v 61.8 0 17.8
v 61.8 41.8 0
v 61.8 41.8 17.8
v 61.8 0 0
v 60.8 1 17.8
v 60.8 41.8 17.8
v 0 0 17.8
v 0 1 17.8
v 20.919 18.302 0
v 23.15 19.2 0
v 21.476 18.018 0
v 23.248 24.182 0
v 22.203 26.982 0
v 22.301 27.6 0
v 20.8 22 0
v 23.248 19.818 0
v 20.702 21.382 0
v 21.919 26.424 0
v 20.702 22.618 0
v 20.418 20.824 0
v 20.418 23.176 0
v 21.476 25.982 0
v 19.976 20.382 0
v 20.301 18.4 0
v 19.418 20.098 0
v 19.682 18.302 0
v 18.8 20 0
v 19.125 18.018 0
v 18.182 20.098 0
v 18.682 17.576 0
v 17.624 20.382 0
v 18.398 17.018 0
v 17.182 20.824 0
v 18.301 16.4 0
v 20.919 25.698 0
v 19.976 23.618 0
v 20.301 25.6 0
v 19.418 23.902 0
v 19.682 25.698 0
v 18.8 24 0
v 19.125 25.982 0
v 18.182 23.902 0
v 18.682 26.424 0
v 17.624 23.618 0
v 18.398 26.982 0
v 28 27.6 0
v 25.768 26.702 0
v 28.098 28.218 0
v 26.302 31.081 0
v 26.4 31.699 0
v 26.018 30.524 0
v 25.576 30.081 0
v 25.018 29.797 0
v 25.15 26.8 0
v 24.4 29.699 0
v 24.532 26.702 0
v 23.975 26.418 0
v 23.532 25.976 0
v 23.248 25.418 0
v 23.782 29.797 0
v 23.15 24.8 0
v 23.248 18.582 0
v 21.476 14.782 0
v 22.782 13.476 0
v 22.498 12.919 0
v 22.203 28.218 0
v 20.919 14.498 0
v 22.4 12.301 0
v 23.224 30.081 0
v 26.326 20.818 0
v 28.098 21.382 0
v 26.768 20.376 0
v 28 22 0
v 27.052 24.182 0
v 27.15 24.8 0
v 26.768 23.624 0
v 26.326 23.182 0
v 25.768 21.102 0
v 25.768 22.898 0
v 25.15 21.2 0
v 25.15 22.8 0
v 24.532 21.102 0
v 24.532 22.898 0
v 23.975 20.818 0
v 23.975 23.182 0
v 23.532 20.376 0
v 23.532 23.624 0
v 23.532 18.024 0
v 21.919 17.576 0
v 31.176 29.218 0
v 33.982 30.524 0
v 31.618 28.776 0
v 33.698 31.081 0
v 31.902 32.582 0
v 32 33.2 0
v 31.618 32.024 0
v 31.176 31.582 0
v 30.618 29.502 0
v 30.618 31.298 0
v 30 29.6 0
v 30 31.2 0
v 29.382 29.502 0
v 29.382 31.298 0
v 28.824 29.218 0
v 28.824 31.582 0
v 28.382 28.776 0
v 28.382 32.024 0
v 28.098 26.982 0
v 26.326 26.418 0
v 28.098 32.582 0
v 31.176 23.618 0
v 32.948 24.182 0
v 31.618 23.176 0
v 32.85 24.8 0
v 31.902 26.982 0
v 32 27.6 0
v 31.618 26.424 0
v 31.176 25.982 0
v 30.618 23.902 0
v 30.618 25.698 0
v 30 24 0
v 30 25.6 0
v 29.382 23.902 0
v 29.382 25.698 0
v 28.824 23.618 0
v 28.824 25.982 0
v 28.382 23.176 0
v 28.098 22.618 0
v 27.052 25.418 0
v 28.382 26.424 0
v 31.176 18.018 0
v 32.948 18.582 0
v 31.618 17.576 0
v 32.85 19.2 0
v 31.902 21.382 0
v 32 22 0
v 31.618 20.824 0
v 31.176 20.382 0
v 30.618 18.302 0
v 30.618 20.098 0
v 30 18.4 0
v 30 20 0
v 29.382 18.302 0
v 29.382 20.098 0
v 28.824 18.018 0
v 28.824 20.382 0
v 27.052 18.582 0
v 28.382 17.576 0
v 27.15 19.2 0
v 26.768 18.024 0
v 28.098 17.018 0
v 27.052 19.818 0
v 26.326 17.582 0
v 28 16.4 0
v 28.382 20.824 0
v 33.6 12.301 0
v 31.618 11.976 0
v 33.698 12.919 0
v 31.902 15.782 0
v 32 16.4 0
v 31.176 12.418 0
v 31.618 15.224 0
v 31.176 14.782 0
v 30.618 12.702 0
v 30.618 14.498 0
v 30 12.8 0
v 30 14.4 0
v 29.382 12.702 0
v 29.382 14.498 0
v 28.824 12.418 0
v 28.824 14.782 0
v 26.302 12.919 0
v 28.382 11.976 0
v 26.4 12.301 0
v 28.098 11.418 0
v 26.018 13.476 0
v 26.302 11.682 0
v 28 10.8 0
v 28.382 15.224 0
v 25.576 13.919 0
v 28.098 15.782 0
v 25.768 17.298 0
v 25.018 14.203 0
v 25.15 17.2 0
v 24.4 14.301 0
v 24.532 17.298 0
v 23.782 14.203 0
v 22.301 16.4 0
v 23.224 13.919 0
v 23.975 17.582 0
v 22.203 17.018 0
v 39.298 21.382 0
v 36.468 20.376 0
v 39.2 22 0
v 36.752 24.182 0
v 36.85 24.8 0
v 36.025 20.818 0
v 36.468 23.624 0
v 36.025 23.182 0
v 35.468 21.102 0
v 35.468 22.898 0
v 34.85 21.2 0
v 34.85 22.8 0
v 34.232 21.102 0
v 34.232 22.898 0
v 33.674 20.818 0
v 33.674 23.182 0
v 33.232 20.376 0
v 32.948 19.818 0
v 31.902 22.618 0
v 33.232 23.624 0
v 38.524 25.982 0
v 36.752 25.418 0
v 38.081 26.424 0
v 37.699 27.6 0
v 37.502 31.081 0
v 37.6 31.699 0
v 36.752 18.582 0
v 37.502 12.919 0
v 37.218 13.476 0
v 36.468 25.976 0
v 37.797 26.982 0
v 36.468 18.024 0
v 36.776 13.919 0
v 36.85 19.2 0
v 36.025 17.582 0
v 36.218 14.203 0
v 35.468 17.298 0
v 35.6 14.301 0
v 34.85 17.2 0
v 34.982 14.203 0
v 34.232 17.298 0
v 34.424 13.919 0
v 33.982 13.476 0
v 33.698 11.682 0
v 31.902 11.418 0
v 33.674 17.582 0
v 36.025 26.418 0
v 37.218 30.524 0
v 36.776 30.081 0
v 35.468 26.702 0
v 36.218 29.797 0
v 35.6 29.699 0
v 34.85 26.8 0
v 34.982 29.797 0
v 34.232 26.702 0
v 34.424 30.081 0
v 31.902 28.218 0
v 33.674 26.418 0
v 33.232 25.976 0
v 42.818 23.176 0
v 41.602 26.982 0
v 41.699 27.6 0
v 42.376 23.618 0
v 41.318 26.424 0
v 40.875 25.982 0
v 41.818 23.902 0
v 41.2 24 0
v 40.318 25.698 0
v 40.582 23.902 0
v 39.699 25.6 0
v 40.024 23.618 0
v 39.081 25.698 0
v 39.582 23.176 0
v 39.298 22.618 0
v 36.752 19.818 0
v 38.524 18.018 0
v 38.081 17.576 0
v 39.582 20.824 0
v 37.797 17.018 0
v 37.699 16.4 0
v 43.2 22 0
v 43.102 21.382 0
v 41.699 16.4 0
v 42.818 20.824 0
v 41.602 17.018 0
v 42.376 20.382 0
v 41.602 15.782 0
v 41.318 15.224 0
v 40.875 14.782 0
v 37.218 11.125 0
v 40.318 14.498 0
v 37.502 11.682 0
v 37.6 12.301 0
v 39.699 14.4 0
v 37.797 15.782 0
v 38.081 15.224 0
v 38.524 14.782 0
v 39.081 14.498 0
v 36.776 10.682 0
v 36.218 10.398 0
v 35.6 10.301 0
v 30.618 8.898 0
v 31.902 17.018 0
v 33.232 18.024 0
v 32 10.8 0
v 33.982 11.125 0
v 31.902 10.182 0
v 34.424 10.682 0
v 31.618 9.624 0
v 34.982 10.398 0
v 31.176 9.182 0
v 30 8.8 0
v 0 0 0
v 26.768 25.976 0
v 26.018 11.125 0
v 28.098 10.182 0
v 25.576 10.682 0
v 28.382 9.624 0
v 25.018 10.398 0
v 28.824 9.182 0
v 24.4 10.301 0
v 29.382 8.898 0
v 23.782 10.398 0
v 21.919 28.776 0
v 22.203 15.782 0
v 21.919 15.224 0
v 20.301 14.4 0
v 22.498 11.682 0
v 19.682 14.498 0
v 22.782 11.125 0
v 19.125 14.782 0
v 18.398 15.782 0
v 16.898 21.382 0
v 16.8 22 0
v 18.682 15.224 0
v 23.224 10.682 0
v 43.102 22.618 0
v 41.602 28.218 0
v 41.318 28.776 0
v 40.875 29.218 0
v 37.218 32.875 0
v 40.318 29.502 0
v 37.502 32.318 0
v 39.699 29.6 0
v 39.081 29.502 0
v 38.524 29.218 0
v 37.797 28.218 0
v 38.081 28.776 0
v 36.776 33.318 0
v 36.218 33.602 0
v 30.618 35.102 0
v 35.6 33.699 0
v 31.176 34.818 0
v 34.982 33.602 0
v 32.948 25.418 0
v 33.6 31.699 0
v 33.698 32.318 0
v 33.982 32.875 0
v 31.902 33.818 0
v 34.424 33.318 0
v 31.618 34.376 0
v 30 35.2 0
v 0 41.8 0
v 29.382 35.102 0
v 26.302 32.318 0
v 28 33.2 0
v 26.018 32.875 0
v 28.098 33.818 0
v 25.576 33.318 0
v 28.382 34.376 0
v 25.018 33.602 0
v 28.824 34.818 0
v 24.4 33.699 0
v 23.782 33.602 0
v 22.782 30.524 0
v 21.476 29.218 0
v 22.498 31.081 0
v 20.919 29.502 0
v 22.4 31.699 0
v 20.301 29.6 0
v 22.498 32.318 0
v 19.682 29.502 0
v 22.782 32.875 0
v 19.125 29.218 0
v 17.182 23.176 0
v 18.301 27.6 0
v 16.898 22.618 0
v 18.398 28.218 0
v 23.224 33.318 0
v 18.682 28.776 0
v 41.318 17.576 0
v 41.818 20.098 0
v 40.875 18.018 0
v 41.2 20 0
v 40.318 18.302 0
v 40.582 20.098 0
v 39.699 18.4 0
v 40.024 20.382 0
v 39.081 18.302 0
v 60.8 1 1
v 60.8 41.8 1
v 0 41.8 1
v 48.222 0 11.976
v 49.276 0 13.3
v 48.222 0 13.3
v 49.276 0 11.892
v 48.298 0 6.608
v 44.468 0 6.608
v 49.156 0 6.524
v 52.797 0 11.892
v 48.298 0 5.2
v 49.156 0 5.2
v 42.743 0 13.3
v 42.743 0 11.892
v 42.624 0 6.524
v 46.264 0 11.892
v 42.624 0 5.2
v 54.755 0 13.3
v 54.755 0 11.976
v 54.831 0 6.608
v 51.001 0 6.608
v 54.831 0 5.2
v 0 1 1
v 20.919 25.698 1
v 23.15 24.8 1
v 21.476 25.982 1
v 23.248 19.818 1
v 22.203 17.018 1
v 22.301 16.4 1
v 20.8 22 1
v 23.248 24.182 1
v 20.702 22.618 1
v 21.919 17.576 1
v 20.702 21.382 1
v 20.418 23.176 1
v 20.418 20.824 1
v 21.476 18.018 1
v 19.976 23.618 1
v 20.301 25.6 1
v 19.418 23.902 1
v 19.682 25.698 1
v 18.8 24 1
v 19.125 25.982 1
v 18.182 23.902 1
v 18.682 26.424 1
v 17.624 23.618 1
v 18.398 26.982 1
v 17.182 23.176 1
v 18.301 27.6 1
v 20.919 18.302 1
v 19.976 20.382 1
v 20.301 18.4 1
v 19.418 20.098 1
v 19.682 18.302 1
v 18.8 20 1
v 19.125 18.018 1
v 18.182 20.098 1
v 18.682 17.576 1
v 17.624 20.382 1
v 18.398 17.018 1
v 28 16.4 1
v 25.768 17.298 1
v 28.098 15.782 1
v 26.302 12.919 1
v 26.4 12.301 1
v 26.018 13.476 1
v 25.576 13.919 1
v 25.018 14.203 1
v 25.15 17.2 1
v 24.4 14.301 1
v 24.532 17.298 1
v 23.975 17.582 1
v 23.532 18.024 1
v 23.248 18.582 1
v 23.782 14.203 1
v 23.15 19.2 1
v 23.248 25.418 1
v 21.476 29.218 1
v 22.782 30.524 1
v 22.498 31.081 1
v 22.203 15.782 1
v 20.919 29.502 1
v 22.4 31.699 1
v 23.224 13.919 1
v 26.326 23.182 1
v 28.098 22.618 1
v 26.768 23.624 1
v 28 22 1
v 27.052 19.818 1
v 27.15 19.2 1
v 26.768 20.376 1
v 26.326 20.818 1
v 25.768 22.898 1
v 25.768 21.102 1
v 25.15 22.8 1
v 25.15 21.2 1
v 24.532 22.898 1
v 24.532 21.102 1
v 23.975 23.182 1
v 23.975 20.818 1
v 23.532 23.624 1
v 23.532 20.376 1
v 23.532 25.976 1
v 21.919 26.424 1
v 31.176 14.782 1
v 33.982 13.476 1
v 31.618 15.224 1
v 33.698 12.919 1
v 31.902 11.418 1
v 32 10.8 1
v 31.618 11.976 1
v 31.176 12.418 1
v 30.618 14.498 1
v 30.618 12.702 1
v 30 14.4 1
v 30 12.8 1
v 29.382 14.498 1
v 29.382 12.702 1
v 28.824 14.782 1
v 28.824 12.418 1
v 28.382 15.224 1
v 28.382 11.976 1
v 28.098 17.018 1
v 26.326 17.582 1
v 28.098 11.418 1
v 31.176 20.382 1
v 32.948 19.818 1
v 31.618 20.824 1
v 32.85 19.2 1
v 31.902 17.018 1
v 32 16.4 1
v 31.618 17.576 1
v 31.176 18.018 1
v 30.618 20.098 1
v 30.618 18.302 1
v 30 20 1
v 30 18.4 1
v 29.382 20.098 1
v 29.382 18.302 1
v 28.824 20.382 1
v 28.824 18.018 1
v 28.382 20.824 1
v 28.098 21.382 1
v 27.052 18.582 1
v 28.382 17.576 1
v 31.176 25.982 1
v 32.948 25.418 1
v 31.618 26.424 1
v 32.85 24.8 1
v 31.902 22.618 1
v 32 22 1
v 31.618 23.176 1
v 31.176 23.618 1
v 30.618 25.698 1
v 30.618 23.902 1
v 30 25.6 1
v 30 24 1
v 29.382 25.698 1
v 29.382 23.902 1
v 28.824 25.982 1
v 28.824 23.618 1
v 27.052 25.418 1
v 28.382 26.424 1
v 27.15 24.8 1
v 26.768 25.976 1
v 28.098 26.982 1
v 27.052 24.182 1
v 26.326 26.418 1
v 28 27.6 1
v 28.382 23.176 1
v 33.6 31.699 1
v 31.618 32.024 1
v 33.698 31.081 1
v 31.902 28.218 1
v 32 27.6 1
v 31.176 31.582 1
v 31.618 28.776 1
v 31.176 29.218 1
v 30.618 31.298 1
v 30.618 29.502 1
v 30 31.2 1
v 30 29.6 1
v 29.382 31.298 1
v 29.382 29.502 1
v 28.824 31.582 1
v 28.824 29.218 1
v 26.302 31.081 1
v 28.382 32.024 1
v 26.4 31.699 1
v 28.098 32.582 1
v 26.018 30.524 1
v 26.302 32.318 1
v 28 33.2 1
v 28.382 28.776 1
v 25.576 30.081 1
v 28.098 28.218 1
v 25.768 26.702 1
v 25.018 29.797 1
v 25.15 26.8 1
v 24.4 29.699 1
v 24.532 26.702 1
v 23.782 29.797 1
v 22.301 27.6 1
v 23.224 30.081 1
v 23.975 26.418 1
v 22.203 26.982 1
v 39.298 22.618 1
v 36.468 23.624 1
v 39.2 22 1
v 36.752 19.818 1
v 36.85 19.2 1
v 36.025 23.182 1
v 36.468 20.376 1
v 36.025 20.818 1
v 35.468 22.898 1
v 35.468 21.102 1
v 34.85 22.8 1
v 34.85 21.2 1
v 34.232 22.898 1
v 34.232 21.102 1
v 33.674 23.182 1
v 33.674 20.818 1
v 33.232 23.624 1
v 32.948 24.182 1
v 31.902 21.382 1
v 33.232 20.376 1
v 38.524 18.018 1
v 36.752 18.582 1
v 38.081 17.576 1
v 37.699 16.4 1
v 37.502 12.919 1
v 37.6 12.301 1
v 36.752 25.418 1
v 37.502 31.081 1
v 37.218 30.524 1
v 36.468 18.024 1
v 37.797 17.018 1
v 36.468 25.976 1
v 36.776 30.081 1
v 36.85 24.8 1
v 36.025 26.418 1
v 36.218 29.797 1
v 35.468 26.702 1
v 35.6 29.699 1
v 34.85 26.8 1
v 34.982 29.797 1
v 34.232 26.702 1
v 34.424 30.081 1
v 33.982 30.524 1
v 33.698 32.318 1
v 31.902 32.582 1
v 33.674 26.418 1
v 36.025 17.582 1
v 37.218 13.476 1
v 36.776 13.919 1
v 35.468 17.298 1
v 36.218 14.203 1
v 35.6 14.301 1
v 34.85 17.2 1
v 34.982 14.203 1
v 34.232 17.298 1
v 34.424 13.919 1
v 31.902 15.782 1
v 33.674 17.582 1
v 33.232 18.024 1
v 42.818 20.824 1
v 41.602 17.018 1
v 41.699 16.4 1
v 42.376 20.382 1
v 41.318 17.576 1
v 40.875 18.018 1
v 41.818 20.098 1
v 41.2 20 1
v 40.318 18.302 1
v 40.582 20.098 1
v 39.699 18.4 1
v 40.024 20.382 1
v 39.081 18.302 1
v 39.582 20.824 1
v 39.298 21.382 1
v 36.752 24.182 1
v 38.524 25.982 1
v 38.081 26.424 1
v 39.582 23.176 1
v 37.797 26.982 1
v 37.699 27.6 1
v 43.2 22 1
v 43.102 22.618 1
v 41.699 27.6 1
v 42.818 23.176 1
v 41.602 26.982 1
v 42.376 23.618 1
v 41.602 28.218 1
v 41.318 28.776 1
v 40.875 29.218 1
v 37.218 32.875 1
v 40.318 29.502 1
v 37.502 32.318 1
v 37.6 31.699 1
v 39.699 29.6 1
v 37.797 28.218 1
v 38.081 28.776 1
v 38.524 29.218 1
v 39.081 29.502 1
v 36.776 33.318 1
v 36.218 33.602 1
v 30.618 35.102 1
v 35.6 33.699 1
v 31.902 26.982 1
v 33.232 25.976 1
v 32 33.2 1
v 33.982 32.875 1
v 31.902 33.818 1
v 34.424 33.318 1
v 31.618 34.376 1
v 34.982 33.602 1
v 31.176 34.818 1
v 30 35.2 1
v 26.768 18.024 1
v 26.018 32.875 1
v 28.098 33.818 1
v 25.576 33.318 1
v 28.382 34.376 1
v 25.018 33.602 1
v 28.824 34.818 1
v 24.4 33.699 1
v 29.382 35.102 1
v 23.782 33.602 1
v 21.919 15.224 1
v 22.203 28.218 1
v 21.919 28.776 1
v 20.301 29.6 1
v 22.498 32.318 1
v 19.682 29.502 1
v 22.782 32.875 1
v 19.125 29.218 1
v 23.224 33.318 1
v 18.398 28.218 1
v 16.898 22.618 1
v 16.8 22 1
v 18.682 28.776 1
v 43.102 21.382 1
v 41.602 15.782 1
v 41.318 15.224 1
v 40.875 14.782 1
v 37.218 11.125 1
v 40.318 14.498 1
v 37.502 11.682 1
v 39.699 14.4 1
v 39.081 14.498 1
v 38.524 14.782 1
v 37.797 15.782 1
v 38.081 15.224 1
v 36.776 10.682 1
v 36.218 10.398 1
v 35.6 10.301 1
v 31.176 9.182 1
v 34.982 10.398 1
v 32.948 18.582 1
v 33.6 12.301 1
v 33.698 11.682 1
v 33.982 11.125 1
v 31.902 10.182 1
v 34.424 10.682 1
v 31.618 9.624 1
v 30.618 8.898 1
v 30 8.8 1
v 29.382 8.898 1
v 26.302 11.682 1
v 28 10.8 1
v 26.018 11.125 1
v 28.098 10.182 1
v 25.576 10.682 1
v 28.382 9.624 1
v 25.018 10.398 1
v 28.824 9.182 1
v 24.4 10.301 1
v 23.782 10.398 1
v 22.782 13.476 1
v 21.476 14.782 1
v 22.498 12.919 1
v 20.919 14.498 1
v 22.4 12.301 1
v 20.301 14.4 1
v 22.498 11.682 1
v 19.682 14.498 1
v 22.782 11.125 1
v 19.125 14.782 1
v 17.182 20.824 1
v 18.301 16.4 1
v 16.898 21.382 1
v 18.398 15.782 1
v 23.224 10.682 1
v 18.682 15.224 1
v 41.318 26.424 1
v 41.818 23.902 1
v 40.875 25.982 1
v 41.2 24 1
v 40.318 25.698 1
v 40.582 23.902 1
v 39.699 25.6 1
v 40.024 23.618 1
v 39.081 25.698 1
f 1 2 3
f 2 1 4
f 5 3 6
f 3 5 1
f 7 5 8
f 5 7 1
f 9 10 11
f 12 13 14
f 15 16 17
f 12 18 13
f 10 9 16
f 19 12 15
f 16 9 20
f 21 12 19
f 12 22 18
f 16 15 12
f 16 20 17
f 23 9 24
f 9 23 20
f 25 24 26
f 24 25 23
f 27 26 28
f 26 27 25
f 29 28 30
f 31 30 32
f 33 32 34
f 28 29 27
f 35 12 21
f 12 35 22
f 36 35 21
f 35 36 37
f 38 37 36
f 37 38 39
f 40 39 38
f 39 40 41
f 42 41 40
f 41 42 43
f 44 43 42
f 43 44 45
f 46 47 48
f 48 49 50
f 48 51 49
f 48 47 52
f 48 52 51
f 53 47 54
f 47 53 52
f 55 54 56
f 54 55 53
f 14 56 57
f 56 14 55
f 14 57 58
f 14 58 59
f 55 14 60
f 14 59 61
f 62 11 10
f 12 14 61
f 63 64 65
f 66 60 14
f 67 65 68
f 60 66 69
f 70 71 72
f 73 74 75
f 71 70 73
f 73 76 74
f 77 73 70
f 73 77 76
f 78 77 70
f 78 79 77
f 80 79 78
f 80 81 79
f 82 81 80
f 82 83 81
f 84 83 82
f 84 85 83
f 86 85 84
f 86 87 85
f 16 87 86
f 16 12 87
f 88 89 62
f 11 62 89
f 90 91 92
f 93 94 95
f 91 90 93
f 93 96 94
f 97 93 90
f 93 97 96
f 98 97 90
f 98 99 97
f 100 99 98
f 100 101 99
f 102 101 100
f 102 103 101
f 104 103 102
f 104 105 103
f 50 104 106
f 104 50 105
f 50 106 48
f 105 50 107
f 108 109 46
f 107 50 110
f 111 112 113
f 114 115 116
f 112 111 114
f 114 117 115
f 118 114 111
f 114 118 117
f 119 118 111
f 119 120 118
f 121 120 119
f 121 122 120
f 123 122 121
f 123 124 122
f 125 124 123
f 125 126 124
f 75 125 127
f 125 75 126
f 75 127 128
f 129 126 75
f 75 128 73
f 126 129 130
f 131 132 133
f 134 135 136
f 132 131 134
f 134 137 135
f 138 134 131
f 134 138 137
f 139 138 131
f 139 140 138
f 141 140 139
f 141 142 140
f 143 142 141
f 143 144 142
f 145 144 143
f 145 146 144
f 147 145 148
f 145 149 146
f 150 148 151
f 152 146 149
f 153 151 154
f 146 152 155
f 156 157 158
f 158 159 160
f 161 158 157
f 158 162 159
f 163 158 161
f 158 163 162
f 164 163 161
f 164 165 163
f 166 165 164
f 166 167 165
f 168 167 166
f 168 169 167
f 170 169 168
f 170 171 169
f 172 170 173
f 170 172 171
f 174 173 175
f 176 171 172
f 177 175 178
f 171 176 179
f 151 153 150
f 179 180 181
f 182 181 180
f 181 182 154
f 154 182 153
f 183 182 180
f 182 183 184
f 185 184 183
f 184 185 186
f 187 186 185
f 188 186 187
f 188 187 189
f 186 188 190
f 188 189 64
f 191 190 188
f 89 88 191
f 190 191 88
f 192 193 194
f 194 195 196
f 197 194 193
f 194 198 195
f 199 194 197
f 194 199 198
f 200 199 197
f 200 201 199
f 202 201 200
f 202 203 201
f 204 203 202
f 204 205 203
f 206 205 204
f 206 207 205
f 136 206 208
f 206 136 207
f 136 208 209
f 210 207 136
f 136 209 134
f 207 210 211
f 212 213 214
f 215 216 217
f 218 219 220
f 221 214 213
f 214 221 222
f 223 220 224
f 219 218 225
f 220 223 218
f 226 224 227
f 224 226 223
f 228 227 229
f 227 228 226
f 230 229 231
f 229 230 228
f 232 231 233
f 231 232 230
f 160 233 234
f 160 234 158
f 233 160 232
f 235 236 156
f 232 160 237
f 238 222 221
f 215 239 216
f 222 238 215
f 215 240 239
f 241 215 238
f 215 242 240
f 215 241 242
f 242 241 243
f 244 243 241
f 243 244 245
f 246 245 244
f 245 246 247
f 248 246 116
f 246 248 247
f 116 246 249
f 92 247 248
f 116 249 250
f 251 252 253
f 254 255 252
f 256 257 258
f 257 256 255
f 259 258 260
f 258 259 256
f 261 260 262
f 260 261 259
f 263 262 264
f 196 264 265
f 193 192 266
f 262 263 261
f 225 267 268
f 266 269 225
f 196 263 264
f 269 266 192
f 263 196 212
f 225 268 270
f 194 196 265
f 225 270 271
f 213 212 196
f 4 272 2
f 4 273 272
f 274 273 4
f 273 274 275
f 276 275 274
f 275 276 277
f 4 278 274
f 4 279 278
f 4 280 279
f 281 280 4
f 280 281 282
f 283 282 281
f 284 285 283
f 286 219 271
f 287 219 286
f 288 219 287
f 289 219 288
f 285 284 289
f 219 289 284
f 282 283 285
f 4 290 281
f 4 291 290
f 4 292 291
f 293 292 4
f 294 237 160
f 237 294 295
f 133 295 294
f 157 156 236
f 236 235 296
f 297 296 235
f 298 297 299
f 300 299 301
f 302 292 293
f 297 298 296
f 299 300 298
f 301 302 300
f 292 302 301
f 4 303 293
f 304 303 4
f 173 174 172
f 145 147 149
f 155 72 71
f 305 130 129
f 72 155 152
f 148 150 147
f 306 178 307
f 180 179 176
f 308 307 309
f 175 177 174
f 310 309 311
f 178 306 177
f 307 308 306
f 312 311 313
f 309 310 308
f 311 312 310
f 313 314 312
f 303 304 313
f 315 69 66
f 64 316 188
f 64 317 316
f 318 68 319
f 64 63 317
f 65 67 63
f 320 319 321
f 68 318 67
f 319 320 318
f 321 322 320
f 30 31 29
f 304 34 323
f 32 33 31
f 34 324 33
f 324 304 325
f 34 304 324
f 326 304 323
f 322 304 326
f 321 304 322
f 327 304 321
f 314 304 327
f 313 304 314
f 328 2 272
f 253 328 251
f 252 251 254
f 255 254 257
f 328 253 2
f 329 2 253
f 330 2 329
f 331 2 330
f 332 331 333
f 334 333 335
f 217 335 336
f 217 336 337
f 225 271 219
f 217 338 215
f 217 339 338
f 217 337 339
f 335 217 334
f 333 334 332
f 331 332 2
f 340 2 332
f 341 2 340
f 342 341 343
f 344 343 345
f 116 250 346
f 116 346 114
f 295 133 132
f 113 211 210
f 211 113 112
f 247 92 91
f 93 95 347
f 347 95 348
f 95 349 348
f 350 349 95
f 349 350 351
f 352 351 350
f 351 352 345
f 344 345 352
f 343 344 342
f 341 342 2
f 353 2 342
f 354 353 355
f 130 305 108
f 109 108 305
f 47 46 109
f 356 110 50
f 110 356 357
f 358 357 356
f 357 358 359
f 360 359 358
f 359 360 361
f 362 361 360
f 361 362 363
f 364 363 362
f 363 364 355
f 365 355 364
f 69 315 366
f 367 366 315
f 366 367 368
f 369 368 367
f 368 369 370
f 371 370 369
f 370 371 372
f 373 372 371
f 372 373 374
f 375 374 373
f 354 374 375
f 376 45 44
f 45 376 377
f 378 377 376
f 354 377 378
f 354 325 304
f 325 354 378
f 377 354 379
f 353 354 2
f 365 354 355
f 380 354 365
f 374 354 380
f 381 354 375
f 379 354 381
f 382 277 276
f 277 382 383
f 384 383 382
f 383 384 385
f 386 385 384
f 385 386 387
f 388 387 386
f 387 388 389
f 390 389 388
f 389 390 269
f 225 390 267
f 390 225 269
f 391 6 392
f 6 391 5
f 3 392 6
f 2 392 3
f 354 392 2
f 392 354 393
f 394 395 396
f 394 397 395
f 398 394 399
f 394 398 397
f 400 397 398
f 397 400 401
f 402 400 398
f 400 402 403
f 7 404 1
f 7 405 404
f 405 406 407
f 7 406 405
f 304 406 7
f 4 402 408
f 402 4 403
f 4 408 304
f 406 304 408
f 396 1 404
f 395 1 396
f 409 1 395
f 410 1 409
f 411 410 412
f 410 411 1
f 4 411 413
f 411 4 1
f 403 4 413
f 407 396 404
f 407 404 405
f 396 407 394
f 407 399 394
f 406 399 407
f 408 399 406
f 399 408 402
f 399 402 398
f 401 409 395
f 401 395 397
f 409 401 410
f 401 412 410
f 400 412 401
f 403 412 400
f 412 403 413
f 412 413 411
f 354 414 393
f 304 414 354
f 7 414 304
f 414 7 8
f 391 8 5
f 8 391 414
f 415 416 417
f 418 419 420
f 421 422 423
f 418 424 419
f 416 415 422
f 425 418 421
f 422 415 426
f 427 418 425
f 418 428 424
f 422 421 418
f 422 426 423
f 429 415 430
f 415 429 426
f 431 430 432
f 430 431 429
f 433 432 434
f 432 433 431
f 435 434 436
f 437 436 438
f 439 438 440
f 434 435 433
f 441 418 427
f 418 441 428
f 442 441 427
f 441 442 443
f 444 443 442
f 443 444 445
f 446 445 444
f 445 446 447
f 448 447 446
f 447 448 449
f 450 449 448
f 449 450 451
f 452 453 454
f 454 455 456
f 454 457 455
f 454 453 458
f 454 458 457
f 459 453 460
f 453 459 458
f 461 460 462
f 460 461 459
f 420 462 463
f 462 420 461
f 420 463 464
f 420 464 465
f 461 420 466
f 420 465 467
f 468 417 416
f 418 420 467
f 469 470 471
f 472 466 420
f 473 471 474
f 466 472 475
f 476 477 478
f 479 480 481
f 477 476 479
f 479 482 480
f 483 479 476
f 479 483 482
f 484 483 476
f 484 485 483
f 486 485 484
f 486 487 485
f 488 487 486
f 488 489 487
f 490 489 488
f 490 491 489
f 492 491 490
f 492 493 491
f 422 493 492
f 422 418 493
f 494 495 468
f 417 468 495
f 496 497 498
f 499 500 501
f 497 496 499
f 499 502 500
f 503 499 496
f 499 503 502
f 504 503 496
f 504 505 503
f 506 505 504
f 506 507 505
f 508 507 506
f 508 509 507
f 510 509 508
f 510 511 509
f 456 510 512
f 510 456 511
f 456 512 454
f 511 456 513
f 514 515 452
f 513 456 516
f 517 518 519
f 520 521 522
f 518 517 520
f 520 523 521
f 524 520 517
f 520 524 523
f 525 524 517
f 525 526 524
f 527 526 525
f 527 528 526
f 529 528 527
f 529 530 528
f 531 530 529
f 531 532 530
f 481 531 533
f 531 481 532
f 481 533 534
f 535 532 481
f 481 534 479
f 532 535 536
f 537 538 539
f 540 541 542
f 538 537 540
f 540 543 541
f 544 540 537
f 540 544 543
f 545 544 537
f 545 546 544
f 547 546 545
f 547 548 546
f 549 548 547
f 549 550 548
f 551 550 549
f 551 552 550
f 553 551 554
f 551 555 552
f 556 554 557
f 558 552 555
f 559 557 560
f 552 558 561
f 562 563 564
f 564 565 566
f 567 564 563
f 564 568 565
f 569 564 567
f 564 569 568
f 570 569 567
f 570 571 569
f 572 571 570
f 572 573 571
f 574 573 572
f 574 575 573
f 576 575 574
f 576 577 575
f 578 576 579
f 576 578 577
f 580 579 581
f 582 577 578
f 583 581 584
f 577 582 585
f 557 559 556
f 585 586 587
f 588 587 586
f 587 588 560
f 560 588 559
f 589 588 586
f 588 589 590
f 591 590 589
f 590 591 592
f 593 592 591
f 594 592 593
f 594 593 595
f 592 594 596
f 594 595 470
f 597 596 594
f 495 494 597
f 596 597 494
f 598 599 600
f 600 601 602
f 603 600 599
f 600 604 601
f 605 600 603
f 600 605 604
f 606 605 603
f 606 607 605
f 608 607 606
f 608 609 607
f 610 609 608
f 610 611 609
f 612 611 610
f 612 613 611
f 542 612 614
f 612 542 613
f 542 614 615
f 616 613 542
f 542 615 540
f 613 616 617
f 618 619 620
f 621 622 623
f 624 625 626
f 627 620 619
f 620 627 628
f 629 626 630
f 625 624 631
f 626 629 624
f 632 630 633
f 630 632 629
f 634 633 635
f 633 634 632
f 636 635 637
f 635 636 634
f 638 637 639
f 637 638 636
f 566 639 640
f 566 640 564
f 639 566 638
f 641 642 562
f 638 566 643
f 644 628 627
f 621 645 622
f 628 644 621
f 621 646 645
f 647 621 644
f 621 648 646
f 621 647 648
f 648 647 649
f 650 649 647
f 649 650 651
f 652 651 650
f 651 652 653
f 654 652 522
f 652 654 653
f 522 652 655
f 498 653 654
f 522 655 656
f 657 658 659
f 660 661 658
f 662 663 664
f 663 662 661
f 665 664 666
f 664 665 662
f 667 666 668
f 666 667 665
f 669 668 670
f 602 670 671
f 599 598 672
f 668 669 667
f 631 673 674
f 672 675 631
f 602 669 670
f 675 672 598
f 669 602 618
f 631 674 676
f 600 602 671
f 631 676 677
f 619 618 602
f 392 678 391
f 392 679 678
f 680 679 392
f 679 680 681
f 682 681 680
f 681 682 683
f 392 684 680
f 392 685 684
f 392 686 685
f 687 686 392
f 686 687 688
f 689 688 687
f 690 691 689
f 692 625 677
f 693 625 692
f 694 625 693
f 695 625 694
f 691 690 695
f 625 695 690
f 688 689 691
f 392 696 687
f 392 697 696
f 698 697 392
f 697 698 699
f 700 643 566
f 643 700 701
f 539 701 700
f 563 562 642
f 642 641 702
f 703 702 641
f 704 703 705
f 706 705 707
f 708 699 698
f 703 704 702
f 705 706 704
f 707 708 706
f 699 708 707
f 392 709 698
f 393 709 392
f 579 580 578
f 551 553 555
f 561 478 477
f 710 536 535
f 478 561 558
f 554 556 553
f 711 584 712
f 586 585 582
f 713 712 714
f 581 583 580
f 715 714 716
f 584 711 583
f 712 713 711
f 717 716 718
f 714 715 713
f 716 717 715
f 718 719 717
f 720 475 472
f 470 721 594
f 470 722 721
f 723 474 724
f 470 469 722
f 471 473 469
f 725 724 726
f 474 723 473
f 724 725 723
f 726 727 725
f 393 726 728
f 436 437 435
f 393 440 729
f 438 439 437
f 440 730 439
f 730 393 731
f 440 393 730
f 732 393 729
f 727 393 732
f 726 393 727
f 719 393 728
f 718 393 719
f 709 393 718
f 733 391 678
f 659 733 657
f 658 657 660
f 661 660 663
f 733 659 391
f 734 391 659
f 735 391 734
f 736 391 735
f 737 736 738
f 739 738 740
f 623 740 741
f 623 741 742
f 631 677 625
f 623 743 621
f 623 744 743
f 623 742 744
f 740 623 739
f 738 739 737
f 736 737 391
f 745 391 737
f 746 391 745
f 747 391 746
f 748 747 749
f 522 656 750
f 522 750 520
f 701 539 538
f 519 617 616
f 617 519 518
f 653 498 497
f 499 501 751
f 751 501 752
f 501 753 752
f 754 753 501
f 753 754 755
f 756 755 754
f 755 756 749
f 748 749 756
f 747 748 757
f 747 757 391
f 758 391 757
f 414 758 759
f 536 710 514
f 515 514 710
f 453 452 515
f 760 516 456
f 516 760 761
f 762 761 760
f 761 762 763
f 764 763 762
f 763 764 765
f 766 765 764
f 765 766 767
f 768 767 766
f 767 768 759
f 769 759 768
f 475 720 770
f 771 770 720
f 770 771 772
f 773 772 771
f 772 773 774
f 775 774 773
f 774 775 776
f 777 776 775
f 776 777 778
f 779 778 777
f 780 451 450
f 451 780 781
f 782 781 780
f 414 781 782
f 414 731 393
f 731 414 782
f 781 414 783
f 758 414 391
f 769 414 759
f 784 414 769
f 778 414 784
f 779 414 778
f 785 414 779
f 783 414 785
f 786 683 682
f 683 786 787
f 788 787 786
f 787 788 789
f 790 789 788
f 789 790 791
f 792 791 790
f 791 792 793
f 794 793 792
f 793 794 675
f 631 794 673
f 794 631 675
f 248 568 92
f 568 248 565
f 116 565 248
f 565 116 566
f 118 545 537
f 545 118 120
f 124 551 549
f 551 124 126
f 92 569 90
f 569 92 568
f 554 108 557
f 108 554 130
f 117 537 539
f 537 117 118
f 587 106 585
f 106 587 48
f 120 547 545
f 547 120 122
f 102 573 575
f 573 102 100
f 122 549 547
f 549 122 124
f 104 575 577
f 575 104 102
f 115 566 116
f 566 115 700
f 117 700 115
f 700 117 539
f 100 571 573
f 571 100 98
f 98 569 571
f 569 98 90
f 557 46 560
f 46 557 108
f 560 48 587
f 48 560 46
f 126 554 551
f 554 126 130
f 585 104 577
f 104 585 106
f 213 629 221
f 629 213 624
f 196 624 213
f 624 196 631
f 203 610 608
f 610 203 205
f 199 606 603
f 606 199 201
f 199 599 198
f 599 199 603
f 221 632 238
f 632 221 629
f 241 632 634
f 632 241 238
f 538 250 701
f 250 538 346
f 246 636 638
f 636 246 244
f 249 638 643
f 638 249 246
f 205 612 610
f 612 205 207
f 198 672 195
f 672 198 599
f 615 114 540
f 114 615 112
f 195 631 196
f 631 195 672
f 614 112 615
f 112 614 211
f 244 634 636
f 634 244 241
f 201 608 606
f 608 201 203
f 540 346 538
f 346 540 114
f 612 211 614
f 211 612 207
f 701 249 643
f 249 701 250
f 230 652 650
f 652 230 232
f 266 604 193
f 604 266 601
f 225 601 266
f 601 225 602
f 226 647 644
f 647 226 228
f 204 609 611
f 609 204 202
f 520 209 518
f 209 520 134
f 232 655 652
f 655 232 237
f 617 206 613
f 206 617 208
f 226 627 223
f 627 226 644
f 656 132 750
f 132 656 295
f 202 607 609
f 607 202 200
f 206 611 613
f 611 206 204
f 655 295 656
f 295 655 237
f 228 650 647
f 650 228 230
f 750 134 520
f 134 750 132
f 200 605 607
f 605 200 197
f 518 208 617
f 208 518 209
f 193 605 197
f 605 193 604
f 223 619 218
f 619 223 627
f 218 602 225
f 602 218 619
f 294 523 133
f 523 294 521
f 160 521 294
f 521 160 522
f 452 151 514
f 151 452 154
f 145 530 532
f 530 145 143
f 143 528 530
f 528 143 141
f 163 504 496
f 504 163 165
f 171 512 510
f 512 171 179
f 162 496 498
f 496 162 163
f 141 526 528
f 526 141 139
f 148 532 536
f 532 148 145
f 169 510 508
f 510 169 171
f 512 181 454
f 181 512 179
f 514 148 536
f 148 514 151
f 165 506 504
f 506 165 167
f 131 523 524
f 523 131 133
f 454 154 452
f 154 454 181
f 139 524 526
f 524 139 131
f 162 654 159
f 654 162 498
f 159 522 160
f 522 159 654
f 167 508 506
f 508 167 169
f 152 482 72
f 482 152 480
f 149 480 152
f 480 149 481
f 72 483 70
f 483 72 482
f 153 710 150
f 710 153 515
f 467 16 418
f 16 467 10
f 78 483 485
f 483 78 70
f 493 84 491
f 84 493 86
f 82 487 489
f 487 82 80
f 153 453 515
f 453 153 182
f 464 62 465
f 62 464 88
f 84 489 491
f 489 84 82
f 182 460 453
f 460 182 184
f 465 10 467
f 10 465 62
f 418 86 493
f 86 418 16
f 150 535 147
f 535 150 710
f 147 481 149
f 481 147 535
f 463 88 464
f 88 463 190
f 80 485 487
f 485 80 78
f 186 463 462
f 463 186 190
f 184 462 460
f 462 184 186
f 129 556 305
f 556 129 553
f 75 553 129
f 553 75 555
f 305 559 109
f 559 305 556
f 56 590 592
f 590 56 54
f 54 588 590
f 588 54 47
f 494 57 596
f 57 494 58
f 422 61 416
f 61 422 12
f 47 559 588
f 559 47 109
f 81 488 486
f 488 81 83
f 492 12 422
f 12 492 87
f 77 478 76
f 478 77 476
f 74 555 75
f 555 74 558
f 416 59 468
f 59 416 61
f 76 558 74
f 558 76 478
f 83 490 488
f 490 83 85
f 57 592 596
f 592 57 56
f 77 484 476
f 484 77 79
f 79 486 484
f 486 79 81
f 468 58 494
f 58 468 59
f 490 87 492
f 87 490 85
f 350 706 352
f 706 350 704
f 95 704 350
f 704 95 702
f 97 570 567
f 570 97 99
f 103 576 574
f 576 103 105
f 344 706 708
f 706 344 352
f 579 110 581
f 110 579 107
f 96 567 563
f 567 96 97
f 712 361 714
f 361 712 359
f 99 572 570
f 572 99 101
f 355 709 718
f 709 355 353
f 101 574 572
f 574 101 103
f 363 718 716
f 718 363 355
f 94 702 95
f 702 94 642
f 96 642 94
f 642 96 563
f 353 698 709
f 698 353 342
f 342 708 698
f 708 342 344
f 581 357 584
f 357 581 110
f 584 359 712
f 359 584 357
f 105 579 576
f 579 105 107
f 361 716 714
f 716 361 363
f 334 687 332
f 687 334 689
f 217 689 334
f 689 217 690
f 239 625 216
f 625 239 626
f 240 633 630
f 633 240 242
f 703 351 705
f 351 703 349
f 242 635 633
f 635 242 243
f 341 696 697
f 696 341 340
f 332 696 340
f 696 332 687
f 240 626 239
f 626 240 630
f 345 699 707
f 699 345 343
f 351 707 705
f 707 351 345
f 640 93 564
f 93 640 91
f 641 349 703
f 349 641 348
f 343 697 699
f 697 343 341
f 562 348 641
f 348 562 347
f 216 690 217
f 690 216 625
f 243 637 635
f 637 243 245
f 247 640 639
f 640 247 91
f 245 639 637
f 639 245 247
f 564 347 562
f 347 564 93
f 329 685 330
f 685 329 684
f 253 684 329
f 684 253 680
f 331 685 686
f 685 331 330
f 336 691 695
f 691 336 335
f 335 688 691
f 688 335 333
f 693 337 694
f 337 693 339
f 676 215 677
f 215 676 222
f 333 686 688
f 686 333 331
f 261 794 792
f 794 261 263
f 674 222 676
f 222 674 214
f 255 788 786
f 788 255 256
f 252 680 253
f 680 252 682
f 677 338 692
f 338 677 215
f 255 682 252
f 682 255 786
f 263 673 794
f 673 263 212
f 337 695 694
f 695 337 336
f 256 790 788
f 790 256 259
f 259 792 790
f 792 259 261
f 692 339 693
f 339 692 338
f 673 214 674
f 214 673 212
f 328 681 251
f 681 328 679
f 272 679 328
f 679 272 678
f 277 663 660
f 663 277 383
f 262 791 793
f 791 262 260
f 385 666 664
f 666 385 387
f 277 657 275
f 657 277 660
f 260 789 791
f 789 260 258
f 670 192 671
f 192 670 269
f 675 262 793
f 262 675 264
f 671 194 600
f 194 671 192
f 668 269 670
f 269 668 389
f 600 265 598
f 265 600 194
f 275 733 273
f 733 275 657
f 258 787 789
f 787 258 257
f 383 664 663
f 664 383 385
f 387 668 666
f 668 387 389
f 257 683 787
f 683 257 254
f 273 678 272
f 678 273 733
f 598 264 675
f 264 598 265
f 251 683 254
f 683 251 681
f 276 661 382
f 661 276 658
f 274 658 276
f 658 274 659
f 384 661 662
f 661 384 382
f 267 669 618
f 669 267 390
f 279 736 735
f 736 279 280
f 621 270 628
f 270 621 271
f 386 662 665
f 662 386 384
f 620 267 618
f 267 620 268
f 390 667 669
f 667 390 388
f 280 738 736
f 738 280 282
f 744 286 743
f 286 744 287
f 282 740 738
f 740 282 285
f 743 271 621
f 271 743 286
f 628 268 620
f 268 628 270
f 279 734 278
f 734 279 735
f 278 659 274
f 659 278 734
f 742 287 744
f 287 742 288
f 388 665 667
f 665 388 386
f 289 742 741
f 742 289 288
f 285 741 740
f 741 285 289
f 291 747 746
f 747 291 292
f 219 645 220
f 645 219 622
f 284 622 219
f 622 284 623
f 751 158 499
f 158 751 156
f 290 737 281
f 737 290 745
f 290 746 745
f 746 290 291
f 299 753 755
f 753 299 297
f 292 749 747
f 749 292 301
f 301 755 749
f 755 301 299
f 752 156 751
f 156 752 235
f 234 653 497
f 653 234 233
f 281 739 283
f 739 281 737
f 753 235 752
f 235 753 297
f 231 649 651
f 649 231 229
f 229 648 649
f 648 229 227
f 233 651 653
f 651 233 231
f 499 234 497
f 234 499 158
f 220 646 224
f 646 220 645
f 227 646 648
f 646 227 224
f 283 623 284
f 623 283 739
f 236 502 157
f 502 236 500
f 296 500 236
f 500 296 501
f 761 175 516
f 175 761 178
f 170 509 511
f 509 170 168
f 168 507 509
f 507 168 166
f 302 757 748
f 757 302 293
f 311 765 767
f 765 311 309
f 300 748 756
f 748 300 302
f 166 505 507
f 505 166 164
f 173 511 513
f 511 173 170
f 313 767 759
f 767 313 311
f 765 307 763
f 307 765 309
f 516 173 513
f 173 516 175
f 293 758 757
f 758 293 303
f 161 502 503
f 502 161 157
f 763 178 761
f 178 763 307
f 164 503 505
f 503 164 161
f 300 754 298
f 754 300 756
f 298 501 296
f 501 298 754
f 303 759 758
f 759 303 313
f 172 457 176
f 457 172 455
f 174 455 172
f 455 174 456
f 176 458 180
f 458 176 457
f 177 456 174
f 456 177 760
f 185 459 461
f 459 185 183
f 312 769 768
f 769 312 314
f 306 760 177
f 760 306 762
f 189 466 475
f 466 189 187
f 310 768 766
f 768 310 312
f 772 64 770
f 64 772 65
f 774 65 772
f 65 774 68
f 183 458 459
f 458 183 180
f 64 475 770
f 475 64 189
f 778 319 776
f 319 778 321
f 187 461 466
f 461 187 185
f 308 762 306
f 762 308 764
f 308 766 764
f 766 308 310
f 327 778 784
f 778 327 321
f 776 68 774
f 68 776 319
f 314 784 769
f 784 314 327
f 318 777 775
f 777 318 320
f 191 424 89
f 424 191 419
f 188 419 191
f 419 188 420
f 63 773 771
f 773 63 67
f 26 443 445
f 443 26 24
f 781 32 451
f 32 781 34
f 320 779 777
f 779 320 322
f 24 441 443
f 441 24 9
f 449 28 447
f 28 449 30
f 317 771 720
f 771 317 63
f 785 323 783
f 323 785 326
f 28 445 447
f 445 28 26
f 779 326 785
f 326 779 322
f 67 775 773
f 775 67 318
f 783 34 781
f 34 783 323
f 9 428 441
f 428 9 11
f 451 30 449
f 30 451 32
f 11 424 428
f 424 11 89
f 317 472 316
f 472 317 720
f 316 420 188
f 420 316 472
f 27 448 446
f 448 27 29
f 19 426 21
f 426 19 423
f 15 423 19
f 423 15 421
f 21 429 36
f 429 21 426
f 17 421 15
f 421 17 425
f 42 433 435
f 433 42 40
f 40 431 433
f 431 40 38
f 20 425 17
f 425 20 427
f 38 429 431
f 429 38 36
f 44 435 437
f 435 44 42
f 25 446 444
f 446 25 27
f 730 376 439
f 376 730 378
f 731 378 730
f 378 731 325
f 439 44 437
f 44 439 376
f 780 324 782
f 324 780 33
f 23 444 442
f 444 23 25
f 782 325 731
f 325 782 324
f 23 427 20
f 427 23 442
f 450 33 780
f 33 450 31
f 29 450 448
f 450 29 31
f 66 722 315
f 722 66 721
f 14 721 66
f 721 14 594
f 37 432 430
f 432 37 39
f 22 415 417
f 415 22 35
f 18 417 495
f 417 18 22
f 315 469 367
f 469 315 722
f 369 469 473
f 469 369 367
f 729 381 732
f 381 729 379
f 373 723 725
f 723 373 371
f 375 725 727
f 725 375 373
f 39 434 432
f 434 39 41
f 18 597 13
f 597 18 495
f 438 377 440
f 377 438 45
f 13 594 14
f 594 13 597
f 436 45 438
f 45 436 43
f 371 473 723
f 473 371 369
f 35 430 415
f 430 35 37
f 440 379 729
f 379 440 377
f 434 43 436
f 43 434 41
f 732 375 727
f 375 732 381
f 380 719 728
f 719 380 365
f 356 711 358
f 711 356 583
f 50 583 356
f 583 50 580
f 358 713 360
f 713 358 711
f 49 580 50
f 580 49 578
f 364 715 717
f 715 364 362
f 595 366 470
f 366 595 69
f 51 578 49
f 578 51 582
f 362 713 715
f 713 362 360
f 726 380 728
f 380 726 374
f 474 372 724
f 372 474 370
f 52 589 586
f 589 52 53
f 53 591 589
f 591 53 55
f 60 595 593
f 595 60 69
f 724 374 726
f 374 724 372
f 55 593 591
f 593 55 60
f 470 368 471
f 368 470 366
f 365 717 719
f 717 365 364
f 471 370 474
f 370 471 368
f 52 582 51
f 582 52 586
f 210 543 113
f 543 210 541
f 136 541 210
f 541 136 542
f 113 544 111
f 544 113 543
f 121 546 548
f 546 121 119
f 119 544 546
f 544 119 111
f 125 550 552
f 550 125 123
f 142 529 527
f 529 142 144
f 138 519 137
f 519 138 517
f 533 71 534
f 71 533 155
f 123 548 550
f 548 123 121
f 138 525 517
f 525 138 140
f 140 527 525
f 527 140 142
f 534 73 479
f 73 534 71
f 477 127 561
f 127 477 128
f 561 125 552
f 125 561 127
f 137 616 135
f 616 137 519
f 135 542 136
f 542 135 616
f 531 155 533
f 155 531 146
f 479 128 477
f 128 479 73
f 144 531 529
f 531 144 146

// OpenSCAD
/* Case parts for Zikzak rev3
 * www.zikzak.ca
 */

// ref
// colours: https://en.wikibooks.org/wiki/OpenSCAD_User_Manual/Transformations#color

// TODO:
// - add cart hole 'sides' as guides for the cart to go down nicely into edge connector
//

// render target
// - leftbacktop
// - rightfrontbottom
// - all
//target = "leftbacktop";
target = "rightfrontbottom";
//target = "all";

// scale? Use this to print out tiny versions for inspection prior to printing real ones
//scale_factor = 1;
scale_factor = 0.4;

// fan holes?
fan_holes = 1;
//fan_holes = 0;

// facets
$fn = 50;

// board params
inner_width = 150;
inner_depth = 100;
inner_height = 40;

// calcs
sloppyness = 2;
wall_thickness = 2.5;
jack_buffer = 2; 			// amount of extra cutout space around each side of a jack

outer_width = inner_width + sloppyness + wall_thickness;
outer_depth = inner_depth + sloppyness + wall_thickness;
outer_height = inner_height + sloppyness + wall_thickness;

module leftbacktop () {
	function r_from_dia(d) = d / 2;

	module walls() {
		union() {
			// left wall
			color ( "thistle" ) {
				cube ( [ wall_thickness, outer_depth, outer_height ] );
			}
			// back wall
			color ( "cadetblue" ) {
				translate ( [ 0, inner_depth + sloppyness, 0 ] ) {
					cube ( [ outer_width, wall_thickness, outer_height ] );
				}
			}
			// top
			color ( "MediumSeaGreen" ) {
				translate ( [ 0, 0, inner_height + sloppyness ] ) {
					cube ( [ outer_width, outer_depth, wall_thickness] );
				}
			}

        } // union
	} // walls

	module cutouts() {
		// LEFT SIDE
		//

		// joy0 + headphone
		translate ( [ -10, 9 - jack_buffer, 25 - jack_buffer ] ) {
			cube( [ 20, 30 + 15 + (2*jack_buffer), 13 + (2*jack_buffer) ] );
		}

		// BACK
		//

		// USB power/serial
		translate ( [ 3 - jack_buffer, inner_depth, 25 - jack_buffer ] ) {
			cube( [ 7 + (2*jack_buffer), 20, 4 + (2*jack_buffer) ] );
		}
		// volume potwheel
		translate ( [ 16, inner_depth, 25 - jack_buffer ] ) {
			cube( [ 15 + (2*jack_buffer), 20, 2 + (2*jack_buffer) ] );
		}
		// PS/2 keyb
		translate ( [ 36, inner_depth, 25 - jack_buffer ] ) {
			cube( [ 15, 20, 15 + (2*jack_buffer) ] );
		}
		// VGA
		translate ( [ 55, inner_depth, 25 - jack_buffer ] ) {
			cube( [ 31, 20, 14 + (2*jack_buffer) ] );
		}
        
        // TOP
        //

   		// cart
		translate ( [ 30, 2, 35 - jack_buffer ] ) {
			cube( [ 82 + (2*jack_buffer), 25+(2*jack_buffer), 20 ] );
		}

	} // cutouts

    module reartrim() {
        translate ( [ 135, inner_depth + sloppyness + 2, 13 ] )  {
            rotate ( [ 90, 0, 180 ] ) {
                linear_extrude(slices=1,height=5) {
                    text ( text="ZZ", size=20, font="DejaVu Sans Mono:style=Bold" );
                } // extrude
            } // rotate
        } // translate
     } // rear trim
     
     module toptrim() {
         translate ( [ 10, 60, 39 + sloppyness  ] )  {
             linear_extrude(slices=1,height=5) {
                text ( text="/////////////////////////", size=20, font="DejaVu Sans Mono:style=Bold",spacing=.3 );
             } // ex
         } // tr
     } // top trim
  
    difference() {
		walls();
		cutouts();
        reartrim();
        toptrim();
	}

} // left back top

module rightfrontbottom () {

	module walls() {
		union() {
			// right wall
			color ( "thistle" ) {
                translate ( [ inner_width + sloppyness, 0, 0 ] ) {
                    cube ( [ wall_thickness, outer_depth, outer_height ] );
                }
			}
			// front wall
			color ( "cadetblue" ) {
                cube ( [ outer_width, wall_thickness, outer_height ] );
			}
			// bottom
			color ( "MediumSeaGreen" ) {
                cube ( [ outer_width, outer_depth, wall_thickness] );
			}

        } // union
	} // walls

    module trimtext() {
        translate ( [ 105, 0, 13 ] )  {
            rotate ( [ 90, 0, 0 ] ) {
                linear_extrude(slices=1,height=5) {
                    text ( text="ZZ", size=20, font="DejaVu Sans Mono:style=Bold" );
                } // extrude
            } // rotate
        } // translate
     } // trim text
    
    difference() {
		walls();
        trimtext();
        if ( fan_holes == 1 ) translate( [ 75, 55, 0 ] ) fanholes();
	}

} // right front bottom

scale ( [ scale_factor, scale_factor, scale_factor ] ) {
	if ( target == "leftbacktop" ) {
		leftbacktop();
	} else if ( target == "rightfrontbottom" ) {
		rightfrontbottom();
	} else if ( target == "all" ) {
        leftbacktop();
        rightfrontbottom();
	}
}

module fanholes() {
    // How large is the fan rotor ? (mm)
RotorDiameter=70;
// How large should each hole be ? (mm)
HolesDiameter=10;
// How much space should be left between each hole, proportionally to the hole size ?
HolesRingsSpacingFraction = 0.4; // [0.1:4.0]
// The height of the generated solids (mm)
Height = 10; 
// The number of faces of each hole outer perimeter
Resoultion=20;// [3:100]


// VARIABLES INITIALIZATION
echo("RotorDiameter=",RotorDiameter);
echo("HolesDiameter=",HolesDiameter);
echo("Height=",Height);
echo("Resoultion=",Resoultion);

HolesBoundingBox = HolesDiameter*(1+HolesRingsSpacingFraction);
echo("HolesBoundingBox=",HolesBoundingBox);
NumberOfRings = RotorDiameter / HolesBoundingBox;
echo("NumberOfRings=",NumberOfRings);

OuterRadius = RotorDiameter/2;
echo("OuterRadius=",OuterRadius);

RingRadiusStep = HolesBoundingBox;
echo("RingRadiusStep=",RingRadiusStep);


 
difference()
{
 for (i=[0:1:NumberOfRings/2])
 {
  difference()
  {  
   for(j=[0:360/((i*HolesBoundingBox*6/HolesBoundingBox)):360])
   {
    translate([sin(j)*(i*HolesBoundingBox),cos(j)*(i*HolesBoundingBox),0])cylinder(h=Height,d=HolesDiameter, center = false, $fn=Resoultion);
   }
  } 
 }
}

} // fanholes
